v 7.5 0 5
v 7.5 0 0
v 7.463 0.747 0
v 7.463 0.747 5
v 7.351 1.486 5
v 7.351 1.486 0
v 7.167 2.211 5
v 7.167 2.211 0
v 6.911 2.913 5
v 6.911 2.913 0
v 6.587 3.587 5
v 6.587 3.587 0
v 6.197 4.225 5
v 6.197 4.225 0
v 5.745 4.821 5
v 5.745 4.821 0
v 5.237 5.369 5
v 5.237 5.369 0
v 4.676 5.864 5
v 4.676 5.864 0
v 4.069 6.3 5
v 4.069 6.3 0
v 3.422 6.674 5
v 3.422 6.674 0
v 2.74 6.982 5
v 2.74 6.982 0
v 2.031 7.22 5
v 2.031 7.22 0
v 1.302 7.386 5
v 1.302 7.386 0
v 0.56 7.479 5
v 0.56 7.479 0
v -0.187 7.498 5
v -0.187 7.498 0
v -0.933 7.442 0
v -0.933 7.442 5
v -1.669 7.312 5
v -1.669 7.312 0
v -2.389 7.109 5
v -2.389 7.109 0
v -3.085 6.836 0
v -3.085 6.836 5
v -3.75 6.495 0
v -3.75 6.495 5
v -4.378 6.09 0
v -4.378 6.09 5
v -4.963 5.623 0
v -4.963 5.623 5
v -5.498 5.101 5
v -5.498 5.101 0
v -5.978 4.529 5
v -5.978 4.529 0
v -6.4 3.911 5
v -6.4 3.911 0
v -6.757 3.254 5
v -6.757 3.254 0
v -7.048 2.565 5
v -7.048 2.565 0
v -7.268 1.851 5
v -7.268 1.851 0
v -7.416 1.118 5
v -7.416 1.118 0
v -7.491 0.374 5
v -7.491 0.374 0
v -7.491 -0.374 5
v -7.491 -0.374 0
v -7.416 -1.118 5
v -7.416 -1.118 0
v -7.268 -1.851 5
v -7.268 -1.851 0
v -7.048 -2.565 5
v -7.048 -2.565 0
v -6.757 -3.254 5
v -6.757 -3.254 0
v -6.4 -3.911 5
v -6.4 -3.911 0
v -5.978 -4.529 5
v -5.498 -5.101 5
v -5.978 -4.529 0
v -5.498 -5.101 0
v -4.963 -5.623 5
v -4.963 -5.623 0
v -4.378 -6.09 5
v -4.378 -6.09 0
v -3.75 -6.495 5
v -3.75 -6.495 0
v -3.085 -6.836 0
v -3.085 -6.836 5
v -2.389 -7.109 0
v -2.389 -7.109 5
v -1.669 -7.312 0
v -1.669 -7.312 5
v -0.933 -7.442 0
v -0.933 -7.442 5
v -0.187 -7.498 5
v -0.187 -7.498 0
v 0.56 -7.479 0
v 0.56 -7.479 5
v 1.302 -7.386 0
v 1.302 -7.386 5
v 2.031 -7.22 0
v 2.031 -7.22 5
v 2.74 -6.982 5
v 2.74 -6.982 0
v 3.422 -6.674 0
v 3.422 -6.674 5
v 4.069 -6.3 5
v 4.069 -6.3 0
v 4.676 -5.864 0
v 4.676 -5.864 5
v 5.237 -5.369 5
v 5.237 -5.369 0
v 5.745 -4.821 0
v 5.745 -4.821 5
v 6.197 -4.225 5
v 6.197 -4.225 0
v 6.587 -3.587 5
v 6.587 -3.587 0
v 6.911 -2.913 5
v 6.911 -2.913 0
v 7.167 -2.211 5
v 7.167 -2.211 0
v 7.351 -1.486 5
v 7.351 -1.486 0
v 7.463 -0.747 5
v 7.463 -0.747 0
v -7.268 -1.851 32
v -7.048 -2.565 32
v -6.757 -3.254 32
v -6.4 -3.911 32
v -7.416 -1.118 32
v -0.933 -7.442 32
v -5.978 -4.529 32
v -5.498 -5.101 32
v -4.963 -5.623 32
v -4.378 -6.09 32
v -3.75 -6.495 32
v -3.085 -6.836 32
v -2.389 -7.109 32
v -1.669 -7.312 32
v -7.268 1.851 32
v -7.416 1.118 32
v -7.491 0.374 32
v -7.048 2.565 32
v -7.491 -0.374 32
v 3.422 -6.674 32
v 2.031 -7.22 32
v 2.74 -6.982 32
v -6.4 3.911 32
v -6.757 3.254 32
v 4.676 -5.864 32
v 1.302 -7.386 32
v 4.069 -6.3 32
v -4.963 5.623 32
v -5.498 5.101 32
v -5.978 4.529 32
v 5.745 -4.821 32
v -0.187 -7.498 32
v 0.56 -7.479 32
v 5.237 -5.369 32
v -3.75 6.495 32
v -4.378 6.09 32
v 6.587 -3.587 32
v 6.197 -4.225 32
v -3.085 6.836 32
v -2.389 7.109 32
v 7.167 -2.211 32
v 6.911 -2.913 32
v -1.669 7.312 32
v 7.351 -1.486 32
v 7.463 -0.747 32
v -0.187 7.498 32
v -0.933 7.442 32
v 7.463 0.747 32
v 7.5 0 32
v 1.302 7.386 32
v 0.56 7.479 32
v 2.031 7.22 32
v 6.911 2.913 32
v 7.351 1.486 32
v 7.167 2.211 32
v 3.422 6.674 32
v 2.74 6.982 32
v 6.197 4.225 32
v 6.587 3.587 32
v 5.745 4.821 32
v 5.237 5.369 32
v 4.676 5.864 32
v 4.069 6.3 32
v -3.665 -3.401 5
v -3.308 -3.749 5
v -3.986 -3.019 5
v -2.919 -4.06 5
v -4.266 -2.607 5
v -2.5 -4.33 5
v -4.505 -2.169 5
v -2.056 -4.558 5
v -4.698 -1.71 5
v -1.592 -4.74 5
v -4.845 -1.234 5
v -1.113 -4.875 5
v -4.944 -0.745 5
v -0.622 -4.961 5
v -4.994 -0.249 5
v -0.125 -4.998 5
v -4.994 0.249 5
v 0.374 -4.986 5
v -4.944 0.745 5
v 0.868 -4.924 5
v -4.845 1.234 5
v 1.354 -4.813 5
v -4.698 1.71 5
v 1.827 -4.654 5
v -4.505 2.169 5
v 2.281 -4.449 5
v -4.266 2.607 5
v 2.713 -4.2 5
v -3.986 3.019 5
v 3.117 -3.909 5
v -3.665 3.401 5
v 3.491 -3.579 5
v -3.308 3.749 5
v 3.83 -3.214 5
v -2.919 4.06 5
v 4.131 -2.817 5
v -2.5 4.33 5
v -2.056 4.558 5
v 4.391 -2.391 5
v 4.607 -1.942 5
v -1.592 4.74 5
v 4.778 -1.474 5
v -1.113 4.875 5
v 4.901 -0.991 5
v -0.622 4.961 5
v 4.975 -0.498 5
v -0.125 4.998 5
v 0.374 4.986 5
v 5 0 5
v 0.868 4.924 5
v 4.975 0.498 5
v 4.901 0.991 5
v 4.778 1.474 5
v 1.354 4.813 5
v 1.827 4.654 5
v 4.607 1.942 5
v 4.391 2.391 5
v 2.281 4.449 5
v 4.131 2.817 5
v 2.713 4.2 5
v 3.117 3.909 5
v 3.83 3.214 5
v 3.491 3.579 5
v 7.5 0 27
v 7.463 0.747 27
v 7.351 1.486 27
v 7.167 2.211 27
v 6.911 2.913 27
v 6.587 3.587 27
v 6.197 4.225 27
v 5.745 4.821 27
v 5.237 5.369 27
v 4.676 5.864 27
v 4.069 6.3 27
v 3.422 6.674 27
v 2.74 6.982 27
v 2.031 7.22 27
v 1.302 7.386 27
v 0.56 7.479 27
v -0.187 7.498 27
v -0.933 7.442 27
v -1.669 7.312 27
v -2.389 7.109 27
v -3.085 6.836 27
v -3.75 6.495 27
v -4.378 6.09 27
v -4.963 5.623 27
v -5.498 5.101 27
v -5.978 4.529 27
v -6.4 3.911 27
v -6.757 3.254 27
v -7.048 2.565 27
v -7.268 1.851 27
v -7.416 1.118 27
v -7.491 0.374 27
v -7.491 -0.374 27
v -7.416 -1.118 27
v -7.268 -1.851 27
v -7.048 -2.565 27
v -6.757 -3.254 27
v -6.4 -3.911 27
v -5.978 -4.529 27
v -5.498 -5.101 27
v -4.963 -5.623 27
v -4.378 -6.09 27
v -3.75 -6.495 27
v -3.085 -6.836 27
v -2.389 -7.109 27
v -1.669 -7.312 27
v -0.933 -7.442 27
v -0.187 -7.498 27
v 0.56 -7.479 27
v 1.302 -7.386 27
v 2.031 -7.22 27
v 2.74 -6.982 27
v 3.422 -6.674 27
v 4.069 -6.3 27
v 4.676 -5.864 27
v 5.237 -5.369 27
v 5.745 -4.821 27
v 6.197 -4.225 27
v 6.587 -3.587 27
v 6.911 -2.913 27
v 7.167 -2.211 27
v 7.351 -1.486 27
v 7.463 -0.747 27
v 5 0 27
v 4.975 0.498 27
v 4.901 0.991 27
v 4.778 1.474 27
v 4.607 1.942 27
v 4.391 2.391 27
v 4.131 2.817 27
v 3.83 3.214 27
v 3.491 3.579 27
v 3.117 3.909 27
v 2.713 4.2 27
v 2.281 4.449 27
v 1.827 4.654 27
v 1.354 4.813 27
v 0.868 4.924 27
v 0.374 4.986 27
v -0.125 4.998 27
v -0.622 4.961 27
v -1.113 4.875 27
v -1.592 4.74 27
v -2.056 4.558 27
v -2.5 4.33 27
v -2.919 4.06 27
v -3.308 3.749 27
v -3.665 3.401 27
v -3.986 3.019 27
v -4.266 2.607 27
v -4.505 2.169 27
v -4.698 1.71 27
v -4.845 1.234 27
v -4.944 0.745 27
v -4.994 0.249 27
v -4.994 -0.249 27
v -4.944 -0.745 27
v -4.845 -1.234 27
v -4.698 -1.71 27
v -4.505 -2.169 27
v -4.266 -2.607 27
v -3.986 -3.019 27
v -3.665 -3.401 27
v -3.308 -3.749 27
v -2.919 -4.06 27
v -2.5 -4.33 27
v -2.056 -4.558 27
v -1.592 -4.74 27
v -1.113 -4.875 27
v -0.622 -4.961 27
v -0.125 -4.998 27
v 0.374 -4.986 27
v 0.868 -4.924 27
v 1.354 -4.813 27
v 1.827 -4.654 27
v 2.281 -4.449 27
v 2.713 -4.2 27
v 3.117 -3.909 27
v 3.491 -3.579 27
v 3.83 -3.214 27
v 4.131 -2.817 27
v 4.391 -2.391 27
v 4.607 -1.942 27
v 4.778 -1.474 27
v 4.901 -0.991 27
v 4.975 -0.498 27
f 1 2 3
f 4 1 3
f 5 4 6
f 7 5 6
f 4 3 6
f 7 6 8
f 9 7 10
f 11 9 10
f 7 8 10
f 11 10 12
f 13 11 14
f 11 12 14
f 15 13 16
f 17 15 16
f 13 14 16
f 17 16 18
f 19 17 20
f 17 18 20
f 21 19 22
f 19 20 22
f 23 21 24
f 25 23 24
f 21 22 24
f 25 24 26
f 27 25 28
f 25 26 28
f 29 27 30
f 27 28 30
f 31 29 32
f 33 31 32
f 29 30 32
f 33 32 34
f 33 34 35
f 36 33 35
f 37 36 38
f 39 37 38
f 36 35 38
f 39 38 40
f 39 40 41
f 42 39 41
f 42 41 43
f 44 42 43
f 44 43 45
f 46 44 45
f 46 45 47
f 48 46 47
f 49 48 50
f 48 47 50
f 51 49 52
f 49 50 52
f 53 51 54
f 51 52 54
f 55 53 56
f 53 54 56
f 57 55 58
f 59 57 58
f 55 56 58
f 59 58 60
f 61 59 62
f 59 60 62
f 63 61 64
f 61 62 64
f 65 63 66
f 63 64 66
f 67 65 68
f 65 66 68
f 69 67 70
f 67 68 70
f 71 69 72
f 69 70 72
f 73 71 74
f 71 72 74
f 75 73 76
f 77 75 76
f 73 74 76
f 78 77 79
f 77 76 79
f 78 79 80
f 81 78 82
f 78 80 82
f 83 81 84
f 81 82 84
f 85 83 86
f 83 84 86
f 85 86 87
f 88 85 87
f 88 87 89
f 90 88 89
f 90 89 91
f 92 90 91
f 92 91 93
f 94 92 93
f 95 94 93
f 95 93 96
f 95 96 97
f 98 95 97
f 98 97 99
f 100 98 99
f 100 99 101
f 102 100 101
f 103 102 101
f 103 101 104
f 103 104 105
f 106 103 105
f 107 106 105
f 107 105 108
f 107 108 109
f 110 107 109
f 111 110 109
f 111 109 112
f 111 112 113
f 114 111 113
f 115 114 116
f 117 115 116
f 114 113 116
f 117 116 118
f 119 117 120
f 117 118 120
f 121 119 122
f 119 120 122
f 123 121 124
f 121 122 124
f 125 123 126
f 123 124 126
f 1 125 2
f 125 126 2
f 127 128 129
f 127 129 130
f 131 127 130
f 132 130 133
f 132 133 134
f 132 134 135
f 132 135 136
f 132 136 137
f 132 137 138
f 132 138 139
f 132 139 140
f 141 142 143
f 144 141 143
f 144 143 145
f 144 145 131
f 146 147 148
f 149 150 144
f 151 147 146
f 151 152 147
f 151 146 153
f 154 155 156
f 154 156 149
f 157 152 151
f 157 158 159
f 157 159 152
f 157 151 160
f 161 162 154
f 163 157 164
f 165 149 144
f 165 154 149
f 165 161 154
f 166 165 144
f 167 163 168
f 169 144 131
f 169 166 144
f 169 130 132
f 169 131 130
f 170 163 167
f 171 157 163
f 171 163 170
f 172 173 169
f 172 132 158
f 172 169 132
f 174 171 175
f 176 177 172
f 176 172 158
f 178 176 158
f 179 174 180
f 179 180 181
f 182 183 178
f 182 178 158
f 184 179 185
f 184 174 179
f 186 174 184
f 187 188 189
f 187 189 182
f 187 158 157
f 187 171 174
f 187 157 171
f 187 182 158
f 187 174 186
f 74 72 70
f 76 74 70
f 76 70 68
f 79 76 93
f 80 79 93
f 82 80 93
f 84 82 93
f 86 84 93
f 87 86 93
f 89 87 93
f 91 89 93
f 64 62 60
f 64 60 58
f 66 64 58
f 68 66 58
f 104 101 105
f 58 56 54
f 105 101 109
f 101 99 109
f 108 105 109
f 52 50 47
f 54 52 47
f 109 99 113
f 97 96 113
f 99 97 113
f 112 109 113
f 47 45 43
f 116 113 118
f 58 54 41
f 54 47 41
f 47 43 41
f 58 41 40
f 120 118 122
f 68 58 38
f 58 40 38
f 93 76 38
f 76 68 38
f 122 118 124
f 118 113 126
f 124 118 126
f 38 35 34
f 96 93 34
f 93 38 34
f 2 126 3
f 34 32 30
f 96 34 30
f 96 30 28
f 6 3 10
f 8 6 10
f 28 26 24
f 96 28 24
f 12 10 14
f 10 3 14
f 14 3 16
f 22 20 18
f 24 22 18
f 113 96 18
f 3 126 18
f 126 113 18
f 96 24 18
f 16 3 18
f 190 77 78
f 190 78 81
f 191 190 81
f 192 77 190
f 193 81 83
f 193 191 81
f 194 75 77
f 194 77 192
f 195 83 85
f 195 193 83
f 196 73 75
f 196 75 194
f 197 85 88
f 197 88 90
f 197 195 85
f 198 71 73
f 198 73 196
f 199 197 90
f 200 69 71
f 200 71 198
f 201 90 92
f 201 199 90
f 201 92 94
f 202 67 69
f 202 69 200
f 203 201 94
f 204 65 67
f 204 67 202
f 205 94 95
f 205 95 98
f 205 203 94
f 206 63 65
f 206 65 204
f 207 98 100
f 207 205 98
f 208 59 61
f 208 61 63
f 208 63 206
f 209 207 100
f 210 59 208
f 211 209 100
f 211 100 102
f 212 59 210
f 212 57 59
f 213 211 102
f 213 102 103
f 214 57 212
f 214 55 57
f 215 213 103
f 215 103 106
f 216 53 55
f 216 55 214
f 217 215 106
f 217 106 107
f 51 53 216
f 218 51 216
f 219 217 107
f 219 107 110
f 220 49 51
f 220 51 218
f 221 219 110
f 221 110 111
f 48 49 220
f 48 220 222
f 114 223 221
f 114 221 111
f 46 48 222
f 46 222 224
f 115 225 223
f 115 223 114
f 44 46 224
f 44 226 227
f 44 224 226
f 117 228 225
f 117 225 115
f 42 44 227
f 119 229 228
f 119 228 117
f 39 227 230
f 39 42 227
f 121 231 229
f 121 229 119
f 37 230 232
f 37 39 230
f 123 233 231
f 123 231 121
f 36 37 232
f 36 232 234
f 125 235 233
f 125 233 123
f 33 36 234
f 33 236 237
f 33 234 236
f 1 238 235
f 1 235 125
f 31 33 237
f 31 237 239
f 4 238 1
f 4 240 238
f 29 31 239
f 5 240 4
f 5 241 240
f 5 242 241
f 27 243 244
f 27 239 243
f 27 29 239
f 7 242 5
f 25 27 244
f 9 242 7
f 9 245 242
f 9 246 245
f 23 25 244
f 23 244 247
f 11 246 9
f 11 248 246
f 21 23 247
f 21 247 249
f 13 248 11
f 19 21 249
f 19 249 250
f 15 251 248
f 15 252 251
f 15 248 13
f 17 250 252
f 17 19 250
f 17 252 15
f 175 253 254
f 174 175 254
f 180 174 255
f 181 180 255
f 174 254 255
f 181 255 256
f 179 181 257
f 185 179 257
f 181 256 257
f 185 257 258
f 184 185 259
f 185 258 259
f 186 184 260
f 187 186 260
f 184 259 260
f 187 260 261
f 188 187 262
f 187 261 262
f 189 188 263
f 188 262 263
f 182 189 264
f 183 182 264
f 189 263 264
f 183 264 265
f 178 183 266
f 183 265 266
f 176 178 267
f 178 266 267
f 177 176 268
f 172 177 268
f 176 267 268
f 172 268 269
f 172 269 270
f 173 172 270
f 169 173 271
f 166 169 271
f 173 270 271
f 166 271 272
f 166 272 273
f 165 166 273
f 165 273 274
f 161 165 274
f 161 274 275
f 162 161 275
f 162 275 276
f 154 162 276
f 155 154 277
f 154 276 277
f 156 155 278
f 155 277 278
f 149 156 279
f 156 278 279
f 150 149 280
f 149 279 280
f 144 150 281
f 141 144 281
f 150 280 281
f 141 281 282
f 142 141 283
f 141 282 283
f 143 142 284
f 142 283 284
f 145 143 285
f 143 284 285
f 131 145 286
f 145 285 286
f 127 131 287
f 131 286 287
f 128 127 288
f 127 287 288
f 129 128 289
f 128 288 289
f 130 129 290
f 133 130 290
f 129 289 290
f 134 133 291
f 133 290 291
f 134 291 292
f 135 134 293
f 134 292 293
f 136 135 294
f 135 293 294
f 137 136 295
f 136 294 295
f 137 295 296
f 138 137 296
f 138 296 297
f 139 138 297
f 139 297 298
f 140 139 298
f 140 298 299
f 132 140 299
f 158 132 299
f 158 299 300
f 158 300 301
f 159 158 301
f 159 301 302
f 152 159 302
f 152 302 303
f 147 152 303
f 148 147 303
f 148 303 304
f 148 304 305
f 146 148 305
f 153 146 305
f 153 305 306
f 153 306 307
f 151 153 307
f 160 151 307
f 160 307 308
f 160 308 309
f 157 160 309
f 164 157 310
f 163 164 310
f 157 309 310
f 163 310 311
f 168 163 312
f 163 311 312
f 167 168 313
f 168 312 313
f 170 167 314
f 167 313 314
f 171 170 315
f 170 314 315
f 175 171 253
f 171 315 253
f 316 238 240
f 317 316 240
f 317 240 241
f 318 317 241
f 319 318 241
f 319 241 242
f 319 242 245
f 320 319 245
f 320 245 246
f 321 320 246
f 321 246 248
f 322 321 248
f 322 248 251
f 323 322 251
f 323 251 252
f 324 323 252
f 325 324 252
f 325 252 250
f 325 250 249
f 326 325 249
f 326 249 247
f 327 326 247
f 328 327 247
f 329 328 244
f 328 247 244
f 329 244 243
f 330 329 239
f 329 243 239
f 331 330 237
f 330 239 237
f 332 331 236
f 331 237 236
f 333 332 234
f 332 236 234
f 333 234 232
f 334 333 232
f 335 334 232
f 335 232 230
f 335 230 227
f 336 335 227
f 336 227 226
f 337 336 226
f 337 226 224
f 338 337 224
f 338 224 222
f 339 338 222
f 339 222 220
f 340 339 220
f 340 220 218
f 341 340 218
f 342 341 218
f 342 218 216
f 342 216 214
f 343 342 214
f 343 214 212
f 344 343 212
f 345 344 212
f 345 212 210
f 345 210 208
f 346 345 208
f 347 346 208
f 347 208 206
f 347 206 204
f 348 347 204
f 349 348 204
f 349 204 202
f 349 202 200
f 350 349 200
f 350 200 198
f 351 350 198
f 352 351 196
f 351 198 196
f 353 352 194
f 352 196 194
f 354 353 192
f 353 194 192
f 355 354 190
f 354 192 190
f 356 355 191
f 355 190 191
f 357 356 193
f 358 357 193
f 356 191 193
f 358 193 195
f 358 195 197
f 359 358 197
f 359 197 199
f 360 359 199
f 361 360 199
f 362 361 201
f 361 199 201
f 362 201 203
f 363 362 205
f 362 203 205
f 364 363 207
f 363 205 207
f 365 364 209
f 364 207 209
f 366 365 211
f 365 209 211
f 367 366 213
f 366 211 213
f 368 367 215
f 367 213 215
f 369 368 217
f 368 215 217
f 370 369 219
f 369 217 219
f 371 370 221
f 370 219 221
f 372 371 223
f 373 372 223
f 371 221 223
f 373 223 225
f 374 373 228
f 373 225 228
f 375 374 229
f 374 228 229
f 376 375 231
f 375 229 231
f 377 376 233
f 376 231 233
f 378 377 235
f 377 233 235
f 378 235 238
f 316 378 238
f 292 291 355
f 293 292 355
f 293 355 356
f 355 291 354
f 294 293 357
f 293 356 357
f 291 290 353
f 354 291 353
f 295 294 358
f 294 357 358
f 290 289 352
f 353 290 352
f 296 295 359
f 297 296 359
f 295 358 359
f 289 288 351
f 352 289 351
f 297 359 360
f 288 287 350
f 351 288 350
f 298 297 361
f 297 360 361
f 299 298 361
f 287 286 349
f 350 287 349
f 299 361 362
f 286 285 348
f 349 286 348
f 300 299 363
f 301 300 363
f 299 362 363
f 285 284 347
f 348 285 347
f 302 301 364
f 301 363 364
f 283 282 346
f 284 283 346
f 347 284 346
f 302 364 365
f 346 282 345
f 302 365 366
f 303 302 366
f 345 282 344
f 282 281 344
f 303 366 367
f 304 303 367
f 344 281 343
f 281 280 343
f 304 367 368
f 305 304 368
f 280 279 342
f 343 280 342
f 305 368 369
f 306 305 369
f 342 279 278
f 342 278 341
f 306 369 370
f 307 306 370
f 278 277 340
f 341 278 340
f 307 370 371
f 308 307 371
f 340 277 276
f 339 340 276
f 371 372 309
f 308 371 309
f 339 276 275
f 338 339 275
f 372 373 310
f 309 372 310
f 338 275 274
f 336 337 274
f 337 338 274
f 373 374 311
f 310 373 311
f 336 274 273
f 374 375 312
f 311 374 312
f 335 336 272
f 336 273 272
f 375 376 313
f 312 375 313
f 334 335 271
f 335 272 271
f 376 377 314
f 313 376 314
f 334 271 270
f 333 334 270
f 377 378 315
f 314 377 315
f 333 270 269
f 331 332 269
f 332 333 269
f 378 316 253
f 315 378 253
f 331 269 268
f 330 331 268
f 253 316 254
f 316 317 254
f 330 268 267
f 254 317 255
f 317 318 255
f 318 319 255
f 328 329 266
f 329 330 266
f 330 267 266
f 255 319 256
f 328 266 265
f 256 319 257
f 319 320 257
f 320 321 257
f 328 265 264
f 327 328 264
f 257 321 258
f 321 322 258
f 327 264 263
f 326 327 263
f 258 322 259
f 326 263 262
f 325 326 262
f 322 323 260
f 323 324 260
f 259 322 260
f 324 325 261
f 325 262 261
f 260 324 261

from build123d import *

# Parameters (mm, degrees)
SKETCH1_R           = 5
BOSS_EXTRUDE1_DEPTH = 32
SKETCH1_4_R         = 7.5
SKETCH1_4_R_2       = 5
BOSS_EXTRUDE2_DEPTH = 5
BOSS_EXTRUDE3_START = 27
SKETCH1_5_R         = 7.5
SKETCH1_5_R_2       = 5
BOSS_EXTRUDE3_DEPTH = 5


with BuildPart() as part:
    # Sketch1 → Boss-Extrude1 (new body)
    with BuildSketch(Plane.XY):
        Circle(SKETCH1_R)
    extrude(amount=BOSS_EXTRUDE1_DEPTH)

    # Sketch1<4> → Boss-Extrude2 (add)
    with BuildSketch(Plane.XY):
        Circle(SKETCH1_4_R)
        Circle(SKETCH1_4_R_2, mode=Mode.SUBTRACT)
    extrude(amount=BOSS_EXTRUDE2_DEPTH)

    # Sketch1<5> → Boss-Extrude3 (add)
    with BuildSketch(Plane.XY.offset(BOSS_EXTRUDE3_START)):
        Circle(SKETCH1_5_R)
        Circle(SKETCH1_5_R_2, mode=Mode.SUBTRACT)
    extrude(amount=BOSS_EXTRUDE3_DEPTH)


solid = part.part
